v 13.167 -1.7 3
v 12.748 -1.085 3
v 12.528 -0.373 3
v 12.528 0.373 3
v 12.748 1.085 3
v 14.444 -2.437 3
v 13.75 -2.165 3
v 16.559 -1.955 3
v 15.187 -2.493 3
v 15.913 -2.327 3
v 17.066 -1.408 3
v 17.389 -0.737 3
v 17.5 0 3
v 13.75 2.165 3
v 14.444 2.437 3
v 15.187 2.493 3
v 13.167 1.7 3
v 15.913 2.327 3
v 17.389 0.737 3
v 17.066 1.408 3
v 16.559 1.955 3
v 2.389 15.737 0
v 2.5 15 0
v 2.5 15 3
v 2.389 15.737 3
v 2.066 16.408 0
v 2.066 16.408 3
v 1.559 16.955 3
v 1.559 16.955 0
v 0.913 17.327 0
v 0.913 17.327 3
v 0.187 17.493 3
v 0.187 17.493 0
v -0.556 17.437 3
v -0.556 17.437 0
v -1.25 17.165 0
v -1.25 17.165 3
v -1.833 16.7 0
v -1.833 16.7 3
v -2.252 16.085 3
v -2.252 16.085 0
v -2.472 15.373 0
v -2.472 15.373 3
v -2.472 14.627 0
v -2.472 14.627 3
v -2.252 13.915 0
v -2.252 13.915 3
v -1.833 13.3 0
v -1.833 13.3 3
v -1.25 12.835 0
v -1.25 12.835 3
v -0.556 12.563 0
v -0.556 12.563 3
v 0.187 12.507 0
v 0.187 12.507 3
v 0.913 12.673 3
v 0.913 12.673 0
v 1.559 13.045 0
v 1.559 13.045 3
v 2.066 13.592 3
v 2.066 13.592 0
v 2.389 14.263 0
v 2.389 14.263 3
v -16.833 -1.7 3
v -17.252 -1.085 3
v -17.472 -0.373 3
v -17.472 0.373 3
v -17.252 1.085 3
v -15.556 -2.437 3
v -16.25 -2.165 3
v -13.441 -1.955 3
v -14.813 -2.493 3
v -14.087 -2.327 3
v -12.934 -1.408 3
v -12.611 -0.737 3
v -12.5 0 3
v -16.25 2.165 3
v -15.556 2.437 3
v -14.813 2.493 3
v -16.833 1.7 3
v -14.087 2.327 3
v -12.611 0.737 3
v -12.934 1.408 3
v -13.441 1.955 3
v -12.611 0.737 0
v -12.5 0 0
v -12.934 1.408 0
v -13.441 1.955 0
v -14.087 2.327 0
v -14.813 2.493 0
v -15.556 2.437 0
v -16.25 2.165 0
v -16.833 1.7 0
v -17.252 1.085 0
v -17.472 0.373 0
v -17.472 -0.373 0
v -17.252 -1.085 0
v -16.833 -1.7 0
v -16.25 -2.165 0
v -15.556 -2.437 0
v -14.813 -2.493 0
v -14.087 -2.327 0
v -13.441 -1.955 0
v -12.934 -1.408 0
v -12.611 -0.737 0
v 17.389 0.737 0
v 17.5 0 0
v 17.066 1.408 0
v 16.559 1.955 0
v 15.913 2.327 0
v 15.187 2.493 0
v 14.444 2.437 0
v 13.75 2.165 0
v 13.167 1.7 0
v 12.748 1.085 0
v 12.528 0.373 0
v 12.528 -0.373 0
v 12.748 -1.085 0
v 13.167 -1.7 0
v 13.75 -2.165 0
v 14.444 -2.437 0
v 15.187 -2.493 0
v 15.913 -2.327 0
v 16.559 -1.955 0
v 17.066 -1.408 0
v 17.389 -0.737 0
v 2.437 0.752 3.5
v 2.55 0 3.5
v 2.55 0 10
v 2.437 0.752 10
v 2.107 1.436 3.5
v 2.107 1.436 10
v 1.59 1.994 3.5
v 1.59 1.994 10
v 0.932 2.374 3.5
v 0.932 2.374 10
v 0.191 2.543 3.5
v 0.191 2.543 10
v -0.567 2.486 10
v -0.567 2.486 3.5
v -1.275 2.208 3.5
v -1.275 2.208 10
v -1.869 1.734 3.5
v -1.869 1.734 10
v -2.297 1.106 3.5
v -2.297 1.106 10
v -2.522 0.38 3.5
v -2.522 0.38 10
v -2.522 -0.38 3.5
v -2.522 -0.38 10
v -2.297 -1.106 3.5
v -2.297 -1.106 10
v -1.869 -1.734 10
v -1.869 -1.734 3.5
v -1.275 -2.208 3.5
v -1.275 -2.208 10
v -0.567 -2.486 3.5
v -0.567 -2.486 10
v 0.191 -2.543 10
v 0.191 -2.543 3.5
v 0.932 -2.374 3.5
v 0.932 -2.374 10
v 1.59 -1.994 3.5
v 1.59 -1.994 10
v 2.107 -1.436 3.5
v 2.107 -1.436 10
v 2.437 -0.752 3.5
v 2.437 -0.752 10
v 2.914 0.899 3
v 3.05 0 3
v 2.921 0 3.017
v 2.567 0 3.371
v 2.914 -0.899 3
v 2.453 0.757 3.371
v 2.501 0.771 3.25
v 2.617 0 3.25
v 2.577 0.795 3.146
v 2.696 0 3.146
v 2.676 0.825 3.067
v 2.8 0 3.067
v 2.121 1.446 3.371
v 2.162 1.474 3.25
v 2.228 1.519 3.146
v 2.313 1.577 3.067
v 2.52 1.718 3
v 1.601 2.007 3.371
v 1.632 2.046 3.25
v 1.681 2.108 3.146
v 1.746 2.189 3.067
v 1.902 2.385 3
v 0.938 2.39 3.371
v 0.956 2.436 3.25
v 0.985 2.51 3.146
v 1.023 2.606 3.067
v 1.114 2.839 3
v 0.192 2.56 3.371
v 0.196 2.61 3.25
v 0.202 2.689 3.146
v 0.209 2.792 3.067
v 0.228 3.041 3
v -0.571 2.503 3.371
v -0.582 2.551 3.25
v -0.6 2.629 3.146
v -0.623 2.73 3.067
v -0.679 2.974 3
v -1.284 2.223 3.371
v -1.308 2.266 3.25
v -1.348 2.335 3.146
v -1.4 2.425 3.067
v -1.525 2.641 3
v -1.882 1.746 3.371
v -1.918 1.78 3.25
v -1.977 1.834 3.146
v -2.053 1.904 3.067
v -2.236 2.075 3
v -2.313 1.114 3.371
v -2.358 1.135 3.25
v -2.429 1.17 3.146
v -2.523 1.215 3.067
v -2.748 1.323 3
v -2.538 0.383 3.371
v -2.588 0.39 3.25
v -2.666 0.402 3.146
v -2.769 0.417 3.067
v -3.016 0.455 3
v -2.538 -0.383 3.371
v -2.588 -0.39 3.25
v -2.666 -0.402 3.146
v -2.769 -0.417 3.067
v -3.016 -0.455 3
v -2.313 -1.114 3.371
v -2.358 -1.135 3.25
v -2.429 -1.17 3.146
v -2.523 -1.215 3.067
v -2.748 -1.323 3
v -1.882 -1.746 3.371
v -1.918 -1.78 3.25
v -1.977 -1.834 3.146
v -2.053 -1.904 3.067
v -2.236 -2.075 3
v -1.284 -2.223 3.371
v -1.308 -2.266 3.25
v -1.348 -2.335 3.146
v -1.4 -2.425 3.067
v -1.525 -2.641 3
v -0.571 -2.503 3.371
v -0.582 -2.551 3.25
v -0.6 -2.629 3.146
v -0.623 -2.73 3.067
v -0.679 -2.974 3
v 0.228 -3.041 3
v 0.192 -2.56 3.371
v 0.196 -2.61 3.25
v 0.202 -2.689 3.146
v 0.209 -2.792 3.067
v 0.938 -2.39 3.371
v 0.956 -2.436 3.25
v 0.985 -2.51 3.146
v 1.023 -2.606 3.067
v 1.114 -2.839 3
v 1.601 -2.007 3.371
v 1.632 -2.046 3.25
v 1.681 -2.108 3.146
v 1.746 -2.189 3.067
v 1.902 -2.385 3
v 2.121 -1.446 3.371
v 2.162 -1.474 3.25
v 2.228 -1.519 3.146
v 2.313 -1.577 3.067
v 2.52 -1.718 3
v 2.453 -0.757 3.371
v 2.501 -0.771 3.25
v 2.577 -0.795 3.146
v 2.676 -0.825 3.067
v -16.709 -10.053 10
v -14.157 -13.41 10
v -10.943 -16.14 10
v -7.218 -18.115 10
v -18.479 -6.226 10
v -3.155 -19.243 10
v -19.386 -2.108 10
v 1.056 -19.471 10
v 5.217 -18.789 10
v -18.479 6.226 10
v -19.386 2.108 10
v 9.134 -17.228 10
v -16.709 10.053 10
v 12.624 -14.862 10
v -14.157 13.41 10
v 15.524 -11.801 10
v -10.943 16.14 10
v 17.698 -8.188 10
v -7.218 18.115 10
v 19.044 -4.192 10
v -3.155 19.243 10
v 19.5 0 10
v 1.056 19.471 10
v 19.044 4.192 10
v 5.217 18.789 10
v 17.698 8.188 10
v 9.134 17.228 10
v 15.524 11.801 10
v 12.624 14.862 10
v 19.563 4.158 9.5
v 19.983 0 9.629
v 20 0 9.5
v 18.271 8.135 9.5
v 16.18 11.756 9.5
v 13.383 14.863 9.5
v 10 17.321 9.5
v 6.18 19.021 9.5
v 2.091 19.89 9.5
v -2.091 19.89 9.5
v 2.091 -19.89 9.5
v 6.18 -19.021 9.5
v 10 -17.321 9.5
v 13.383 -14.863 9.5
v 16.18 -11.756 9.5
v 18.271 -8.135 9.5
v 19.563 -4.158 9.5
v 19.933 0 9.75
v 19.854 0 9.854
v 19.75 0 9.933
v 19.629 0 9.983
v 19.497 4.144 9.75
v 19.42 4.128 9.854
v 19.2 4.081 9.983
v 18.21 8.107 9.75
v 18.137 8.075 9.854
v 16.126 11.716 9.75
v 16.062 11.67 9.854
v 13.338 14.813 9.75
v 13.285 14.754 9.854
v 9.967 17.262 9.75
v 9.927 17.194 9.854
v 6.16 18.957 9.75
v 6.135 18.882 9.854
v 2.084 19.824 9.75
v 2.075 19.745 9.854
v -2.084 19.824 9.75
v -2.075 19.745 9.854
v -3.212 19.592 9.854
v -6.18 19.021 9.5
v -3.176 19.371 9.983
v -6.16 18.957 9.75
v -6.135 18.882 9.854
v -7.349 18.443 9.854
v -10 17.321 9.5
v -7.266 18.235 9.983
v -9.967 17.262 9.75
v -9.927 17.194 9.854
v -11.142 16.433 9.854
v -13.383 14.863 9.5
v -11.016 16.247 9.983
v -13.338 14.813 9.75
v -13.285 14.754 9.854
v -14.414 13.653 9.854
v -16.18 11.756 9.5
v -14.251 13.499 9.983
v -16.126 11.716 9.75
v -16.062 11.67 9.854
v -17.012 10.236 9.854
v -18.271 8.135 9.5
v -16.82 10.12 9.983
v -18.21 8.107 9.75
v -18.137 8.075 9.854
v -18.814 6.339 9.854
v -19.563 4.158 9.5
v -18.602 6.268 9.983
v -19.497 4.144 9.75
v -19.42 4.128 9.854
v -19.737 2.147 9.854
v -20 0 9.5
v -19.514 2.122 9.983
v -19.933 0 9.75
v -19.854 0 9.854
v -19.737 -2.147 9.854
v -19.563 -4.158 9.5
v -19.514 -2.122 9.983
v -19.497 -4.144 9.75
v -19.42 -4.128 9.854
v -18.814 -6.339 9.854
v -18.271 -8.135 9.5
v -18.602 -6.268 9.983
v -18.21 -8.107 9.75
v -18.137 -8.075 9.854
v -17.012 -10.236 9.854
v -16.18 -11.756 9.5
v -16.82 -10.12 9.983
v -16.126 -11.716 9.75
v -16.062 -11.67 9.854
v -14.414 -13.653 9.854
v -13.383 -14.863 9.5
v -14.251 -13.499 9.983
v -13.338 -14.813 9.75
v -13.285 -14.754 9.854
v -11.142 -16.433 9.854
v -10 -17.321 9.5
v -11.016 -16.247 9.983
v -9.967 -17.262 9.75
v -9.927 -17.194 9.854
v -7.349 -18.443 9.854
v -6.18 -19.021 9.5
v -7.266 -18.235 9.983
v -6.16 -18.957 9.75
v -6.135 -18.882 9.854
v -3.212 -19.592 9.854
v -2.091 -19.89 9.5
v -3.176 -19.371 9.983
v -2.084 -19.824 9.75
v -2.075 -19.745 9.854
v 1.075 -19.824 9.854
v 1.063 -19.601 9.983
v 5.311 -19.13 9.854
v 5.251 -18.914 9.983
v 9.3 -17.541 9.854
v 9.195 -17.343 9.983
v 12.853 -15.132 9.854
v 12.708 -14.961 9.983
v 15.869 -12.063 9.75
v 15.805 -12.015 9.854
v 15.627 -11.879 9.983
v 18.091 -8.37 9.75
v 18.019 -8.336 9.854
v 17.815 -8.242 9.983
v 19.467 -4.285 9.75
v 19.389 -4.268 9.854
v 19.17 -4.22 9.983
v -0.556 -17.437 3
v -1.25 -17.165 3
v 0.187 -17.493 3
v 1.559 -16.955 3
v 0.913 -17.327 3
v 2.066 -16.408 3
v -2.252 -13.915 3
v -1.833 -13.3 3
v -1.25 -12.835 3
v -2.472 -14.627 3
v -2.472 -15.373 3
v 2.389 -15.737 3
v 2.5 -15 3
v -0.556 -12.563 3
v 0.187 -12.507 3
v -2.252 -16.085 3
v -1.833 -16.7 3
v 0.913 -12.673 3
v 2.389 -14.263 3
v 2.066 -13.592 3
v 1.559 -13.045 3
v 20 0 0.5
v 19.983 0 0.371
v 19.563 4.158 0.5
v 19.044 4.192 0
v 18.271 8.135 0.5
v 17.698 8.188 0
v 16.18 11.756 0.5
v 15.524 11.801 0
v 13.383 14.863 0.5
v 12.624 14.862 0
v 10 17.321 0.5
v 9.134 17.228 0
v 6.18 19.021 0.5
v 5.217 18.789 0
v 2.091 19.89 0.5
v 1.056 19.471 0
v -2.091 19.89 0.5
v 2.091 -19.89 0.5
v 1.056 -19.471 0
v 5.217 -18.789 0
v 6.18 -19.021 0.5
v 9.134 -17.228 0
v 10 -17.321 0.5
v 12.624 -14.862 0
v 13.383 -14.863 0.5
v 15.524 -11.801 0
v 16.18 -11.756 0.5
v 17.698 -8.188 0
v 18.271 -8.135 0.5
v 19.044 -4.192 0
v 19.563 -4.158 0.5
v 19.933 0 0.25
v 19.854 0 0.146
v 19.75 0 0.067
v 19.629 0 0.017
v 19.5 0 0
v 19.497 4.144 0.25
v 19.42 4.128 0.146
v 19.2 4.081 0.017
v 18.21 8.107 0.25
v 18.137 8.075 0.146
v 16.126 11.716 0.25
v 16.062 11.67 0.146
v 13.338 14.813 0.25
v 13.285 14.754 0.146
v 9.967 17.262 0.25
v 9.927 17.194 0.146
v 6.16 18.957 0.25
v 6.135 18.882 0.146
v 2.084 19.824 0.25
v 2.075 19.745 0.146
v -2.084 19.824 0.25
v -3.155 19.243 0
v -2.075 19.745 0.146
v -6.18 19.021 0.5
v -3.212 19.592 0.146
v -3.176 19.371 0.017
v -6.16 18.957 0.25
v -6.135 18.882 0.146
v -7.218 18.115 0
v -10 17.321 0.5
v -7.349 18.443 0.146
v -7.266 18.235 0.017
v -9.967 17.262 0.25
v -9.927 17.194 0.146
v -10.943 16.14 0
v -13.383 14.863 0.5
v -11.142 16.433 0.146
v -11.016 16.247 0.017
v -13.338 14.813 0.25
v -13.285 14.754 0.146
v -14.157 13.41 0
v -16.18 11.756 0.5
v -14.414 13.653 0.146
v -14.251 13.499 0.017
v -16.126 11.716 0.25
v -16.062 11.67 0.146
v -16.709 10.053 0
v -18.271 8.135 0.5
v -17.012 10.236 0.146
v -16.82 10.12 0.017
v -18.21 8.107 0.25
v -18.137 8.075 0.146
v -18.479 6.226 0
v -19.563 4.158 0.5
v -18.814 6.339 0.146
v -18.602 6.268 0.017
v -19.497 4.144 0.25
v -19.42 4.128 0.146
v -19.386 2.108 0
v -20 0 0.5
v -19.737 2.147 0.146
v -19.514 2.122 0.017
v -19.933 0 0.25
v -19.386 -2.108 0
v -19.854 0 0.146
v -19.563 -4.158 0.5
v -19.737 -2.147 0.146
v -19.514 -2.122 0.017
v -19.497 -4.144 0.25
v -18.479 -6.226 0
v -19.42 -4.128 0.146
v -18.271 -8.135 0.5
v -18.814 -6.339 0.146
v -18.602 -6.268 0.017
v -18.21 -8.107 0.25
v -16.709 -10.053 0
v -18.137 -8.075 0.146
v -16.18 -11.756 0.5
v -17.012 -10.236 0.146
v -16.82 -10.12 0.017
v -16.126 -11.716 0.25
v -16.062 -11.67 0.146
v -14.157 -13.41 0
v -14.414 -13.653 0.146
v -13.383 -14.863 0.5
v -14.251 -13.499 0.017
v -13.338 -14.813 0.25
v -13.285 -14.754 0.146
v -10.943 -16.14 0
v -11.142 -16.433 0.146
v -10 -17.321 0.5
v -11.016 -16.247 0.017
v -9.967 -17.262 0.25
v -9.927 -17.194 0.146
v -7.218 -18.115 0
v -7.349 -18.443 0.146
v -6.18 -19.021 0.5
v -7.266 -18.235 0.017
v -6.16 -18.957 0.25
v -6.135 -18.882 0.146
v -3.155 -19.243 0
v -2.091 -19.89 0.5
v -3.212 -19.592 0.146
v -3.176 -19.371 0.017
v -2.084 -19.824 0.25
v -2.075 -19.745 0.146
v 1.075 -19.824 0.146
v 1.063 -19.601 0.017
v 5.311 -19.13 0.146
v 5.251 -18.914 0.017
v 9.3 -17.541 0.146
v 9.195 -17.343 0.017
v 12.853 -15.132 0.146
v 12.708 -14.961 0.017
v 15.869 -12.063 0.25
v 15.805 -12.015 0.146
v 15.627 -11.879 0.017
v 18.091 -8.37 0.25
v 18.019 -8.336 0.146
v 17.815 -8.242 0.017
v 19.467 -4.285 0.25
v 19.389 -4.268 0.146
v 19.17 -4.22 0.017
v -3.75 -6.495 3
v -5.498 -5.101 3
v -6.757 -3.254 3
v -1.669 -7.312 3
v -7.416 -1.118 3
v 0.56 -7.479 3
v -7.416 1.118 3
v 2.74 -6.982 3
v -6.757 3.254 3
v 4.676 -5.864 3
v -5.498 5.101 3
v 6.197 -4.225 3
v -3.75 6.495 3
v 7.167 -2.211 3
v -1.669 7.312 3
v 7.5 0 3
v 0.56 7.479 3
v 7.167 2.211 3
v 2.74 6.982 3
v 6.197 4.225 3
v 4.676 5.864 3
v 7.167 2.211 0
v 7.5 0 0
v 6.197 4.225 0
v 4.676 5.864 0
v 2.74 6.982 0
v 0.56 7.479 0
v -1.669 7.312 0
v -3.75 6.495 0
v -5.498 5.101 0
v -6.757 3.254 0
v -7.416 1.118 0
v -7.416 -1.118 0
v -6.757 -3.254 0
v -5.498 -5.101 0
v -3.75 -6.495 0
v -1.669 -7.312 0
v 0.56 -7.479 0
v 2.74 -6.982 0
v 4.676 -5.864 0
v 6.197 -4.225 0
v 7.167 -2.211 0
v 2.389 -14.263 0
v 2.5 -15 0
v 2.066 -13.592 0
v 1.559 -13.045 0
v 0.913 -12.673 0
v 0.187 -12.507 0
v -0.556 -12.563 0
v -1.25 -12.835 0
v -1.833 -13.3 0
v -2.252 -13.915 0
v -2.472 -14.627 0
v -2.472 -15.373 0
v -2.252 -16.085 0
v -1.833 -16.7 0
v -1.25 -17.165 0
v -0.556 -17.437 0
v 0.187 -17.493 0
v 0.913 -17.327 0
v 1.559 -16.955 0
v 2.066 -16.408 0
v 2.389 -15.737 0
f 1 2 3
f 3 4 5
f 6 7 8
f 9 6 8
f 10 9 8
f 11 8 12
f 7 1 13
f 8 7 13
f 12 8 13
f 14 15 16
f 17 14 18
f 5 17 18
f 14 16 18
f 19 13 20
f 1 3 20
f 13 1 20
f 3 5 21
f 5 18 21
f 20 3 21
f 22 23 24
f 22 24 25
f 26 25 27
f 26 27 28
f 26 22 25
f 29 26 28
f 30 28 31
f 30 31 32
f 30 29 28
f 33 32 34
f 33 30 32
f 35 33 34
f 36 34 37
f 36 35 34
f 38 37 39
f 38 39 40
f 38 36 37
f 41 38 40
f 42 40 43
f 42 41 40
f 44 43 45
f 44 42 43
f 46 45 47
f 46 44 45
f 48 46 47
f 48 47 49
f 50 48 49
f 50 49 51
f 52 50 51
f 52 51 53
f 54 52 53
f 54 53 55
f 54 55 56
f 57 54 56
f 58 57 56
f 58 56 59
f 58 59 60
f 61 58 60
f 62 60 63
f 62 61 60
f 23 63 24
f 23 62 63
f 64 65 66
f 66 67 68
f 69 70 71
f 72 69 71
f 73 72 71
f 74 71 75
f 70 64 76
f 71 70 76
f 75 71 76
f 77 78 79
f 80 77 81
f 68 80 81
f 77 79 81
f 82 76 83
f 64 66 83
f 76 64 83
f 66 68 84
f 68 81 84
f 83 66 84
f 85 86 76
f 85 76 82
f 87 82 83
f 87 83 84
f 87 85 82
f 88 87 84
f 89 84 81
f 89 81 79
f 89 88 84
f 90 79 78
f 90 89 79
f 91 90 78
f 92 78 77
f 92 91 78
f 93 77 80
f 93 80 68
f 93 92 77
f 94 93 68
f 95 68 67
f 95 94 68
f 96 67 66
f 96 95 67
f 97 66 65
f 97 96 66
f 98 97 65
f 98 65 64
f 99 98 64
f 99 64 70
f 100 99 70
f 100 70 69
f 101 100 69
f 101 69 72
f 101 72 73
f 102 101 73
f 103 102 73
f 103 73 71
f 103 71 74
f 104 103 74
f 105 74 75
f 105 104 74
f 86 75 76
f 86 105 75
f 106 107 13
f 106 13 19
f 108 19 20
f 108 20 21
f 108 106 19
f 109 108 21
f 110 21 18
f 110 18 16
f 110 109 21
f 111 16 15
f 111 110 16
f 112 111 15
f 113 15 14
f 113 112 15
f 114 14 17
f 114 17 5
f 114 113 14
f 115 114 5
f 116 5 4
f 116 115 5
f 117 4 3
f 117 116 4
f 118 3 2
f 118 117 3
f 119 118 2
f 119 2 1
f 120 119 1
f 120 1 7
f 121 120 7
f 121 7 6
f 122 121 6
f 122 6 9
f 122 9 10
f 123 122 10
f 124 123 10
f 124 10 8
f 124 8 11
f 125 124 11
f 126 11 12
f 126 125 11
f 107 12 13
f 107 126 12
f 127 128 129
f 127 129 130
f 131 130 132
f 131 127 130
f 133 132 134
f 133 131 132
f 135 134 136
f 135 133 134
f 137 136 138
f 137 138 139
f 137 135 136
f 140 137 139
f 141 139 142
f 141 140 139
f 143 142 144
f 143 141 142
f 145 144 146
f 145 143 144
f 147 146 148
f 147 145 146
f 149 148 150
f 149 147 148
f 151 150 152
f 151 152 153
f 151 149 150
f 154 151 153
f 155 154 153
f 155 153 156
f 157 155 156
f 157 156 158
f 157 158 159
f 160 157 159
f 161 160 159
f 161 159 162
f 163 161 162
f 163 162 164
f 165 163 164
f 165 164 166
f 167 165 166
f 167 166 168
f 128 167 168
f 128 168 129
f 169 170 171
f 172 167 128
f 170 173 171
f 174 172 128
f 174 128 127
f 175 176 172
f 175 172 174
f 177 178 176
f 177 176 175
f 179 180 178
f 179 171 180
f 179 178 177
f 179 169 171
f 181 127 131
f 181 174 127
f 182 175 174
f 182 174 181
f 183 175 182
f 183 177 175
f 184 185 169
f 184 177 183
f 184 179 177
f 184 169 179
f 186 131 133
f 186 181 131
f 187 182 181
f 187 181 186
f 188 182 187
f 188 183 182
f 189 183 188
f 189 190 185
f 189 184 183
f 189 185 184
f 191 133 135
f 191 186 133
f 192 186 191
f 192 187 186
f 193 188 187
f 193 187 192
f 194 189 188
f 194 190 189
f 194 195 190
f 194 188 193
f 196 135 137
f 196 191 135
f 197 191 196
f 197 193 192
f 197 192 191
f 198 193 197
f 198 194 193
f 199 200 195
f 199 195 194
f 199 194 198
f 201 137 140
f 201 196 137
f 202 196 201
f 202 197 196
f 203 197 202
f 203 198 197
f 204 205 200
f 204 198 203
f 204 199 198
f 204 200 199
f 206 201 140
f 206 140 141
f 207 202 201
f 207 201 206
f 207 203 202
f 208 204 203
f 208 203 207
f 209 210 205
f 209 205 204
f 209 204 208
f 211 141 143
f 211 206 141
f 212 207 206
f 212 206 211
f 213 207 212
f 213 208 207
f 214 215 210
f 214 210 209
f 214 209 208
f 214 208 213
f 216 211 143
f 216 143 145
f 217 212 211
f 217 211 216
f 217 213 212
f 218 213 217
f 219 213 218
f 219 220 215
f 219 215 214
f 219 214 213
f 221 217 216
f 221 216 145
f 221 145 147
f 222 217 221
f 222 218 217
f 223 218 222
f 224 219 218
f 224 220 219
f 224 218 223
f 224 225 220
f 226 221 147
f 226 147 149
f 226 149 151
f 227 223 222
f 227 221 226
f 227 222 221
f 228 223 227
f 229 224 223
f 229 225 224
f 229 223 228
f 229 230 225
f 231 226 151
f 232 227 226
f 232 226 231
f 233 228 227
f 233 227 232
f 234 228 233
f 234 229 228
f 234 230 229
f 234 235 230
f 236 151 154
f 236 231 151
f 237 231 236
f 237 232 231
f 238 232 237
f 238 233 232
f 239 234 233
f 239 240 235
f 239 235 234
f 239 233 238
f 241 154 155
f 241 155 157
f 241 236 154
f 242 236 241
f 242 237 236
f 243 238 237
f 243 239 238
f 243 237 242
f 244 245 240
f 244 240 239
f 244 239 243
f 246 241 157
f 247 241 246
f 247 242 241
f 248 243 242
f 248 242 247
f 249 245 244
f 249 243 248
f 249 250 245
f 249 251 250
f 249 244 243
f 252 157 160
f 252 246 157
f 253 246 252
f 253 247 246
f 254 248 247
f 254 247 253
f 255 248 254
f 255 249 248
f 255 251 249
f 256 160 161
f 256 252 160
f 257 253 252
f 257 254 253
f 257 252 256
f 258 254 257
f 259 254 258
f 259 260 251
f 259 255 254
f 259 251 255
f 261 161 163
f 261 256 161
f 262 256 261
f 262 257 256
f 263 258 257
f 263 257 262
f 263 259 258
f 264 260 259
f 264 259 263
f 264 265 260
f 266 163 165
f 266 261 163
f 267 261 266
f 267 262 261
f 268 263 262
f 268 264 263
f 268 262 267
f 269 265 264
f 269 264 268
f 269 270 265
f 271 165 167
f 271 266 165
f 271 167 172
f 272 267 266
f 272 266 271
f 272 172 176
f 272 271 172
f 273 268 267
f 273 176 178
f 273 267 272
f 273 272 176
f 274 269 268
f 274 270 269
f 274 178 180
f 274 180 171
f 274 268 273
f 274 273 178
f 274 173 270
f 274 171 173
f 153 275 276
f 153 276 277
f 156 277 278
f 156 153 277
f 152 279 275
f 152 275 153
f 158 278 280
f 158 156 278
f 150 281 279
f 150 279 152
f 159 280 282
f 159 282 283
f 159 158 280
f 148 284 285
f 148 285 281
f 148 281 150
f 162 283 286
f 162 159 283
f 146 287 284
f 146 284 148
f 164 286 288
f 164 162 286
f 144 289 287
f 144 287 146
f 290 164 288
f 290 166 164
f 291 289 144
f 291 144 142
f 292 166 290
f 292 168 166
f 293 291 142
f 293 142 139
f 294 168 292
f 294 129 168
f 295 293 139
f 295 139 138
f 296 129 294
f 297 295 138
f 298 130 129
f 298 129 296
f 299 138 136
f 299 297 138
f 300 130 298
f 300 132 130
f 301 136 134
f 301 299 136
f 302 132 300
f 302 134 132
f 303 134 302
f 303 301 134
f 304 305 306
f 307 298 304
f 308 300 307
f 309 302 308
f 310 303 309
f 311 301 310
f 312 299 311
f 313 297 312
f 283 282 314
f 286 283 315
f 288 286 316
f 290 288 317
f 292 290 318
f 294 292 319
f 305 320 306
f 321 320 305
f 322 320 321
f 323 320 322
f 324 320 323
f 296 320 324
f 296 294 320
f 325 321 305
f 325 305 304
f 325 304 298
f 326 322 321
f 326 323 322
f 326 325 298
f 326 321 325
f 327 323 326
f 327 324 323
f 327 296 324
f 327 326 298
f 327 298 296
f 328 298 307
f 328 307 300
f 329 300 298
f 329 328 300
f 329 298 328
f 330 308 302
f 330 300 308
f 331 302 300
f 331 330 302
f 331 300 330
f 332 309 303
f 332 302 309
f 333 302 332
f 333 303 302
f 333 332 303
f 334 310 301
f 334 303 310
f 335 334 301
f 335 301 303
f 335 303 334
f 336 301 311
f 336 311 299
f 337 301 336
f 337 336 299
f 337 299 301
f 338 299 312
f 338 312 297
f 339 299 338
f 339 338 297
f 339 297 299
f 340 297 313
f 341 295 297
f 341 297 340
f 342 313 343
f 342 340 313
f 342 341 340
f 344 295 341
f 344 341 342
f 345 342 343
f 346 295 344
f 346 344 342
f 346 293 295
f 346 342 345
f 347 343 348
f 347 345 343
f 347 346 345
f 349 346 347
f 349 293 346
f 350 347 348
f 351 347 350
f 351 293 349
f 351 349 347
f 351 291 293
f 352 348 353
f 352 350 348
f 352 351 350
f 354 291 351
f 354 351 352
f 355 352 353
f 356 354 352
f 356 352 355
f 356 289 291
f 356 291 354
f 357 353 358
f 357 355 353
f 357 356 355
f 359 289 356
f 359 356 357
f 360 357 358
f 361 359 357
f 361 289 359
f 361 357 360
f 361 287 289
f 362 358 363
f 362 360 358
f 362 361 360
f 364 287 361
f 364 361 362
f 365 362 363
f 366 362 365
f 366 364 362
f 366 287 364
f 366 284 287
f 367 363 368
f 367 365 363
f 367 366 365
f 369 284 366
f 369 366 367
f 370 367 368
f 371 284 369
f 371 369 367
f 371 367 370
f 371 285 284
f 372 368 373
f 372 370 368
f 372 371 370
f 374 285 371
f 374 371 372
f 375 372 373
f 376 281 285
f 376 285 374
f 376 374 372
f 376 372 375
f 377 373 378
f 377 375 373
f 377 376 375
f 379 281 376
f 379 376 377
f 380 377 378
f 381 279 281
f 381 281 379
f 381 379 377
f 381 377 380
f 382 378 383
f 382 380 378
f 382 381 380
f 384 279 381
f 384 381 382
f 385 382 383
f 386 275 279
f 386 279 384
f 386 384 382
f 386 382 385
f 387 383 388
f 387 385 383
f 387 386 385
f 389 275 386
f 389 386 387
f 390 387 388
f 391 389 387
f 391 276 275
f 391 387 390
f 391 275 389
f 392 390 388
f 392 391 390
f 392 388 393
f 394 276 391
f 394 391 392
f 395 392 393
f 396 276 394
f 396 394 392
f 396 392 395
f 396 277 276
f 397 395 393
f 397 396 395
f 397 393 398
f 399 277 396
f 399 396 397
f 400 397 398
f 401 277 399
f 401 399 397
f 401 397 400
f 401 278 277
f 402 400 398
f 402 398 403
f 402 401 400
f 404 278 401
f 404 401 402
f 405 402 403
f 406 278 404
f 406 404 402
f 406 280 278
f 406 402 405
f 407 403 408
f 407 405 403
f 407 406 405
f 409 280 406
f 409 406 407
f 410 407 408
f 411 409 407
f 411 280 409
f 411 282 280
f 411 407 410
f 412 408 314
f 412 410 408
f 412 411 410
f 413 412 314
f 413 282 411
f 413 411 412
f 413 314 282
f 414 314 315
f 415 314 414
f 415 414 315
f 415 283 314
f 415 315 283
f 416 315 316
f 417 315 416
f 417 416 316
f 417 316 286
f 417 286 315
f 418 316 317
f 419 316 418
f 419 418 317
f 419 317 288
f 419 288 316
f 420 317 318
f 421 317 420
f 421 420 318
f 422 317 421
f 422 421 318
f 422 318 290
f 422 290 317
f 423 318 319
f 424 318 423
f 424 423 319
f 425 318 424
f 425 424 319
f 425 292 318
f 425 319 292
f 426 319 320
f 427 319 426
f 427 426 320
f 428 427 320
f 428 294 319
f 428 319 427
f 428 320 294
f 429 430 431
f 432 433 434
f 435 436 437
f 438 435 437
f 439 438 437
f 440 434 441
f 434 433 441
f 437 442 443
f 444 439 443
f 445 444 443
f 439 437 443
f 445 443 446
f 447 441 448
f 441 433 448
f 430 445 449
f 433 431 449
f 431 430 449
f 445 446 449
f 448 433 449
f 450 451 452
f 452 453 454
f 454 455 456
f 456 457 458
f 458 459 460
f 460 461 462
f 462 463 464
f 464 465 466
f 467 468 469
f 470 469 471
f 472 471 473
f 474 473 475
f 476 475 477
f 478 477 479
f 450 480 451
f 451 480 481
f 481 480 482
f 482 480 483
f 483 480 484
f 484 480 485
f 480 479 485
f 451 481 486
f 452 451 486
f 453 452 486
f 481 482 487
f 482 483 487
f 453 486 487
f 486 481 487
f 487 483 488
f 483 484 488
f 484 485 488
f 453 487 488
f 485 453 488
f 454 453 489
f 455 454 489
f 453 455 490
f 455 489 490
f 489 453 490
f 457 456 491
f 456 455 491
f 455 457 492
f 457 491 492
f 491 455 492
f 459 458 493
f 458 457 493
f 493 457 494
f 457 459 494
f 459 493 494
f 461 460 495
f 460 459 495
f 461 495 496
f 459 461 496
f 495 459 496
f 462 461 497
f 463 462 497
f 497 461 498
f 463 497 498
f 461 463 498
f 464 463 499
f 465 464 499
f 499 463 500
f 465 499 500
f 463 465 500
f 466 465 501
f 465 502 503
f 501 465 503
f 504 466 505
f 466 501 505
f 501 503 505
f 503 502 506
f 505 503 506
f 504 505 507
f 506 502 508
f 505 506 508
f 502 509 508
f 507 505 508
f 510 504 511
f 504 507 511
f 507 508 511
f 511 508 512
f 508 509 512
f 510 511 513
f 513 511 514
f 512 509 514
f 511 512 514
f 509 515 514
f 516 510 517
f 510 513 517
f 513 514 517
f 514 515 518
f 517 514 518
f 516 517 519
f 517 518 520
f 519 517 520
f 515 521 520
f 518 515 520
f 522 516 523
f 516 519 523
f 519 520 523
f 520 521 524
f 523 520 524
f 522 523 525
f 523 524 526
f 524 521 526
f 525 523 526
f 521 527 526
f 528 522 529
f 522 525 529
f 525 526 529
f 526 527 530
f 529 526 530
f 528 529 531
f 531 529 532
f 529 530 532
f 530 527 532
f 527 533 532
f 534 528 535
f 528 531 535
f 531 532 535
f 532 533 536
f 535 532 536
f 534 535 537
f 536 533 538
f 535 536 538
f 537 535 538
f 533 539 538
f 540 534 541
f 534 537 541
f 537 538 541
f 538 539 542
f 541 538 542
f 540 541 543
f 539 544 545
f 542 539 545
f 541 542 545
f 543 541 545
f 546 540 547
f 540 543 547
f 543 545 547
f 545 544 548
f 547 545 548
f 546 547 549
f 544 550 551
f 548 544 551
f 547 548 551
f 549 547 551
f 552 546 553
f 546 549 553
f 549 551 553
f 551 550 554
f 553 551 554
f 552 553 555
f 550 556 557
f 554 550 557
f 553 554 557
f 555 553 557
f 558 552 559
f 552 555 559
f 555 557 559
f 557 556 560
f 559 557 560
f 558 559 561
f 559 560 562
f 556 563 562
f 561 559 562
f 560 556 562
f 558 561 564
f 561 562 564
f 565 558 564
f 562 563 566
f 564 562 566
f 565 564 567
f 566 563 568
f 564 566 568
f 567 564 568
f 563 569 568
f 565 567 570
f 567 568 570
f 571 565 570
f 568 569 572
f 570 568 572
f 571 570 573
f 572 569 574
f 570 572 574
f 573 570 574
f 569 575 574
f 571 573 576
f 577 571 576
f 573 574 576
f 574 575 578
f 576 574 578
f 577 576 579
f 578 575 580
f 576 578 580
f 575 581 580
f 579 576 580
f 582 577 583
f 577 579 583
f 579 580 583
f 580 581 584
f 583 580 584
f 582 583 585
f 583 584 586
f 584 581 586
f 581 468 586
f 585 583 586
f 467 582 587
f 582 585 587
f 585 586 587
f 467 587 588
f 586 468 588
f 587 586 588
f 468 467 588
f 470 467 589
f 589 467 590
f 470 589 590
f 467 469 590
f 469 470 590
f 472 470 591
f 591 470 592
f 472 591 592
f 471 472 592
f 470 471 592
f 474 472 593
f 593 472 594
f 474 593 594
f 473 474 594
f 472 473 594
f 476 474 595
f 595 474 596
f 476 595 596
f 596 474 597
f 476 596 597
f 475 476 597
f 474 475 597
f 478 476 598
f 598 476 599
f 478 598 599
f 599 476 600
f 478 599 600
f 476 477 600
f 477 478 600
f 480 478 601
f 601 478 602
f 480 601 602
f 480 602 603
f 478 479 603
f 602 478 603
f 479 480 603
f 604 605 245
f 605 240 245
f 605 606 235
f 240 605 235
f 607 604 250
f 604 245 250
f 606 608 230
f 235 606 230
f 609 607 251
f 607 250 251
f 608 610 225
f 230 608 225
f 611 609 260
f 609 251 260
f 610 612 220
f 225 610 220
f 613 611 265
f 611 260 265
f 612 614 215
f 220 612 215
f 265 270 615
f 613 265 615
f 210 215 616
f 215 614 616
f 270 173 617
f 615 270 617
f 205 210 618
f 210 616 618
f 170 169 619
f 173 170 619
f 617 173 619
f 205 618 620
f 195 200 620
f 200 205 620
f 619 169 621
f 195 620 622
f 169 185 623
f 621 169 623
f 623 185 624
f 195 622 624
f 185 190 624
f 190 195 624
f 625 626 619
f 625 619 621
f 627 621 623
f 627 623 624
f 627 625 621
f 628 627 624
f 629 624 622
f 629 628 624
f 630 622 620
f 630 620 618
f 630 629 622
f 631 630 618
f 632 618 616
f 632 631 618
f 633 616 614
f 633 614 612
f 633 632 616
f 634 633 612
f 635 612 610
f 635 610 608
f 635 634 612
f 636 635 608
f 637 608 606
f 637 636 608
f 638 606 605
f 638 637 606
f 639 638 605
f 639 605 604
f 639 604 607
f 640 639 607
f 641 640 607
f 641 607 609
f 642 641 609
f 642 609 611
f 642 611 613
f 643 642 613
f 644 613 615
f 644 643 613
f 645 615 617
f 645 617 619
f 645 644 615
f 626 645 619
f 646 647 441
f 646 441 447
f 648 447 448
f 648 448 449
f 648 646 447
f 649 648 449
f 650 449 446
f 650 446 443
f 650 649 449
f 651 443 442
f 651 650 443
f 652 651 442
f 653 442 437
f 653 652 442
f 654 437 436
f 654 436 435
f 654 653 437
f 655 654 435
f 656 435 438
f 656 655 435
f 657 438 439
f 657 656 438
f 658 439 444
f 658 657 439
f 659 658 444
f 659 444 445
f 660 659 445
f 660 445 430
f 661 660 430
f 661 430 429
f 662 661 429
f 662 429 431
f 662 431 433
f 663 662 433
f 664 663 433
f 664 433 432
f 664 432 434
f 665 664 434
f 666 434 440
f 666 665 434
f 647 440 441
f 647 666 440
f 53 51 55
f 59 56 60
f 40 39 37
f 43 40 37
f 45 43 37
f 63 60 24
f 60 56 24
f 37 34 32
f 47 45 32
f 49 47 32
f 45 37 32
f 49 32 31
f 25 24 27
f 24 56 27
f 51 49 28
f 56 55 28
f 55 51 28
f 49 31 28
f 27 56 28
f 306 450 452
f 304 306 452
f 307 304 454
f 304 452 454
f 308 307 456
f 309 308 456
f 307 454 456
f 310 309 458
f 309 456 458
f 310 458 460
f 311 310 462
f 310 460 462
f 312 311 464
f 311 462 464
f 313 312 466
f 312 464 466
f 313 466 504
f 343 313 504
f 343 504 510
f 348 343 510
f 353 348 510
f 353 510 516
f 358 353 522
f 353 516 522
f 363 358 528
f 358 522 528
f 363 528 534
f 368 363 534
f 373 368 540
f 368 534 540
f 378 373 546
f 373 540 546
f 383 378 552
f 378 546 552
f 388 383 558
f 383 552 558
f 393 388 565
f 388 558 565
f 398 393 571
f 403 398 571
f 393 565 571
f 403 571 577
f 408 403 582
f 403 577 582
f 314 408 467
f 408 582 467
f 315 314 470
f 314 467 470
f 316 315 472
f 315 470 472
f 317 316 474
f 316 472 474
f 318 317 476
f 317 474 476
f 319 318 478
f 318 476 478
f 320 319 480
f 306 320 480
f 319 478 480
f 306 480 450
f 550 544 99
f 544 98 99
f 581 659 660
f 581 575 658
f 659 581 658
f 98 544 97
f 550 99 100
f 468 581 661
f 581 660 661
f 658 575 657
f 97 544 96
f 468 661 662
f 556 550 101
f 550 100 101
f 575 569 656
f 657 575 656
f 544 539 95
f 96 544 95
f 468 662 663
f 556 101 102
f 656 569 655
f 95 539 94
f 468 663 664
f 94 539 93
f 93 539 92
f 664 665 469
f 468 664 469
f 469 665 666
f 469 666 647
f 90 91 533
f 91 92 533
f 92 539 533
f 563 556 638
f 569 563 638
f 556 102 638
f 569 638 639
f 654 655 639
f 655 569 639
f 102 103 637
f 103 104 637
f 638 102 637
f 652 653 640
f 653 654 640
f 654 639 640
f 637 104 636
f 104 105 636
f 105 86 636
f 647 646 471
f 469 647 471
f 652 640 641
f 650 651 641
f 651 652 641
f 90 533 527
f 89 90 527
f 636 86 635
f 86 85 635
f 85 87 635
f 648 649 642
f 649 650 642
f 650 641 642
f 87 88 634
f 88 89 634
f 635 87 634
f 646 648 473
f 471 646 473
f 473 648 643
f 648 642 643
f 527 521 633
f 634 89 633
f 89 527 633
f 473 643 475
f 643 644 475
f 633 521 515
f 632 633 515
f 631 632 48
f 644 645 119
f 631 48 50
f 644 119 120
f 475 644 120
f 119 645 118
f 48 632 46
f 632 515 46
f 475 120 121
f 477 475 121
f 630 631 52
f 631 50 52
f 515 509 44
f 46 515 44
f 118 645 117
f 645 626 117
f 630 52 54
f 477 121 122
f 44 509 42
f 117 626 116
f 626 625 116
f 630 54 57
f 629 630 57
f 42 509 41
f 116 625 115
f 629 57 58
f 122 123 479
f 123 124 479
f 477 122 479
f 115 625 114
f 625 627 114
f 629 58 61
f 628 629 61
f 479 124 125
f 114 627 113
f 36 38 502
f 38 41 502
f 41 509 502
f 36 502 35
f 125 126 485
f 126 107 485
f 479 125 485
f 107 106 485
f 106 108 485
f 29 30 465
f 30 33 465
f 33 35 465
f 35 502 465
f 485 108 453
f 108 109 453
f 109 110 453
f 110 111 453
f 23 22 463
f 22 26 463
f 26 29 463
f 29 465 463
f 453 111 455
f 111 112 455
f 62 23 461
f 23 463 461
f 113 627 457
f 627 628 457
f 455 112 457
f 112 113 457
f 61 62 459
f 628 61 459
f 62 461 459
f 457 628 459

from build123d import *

# Parameters (mm, degrees)
F0_R     = 20
F0_R_2   = 2.5
F0_R_3   = 7.5
F0_R_4   = 2.55
F1_DEPTH = 10
F2_DEPTH = 3
F3_R     = 0.5


with BuildPart() as f1:
    # F0 (on Top) → F1 (new body)
    with BuildSketch(Plane.XY):
        Circle(F0_R)
        with Locations((0, -15)):
            Circle(F0_R_2, mode=Mode.SUBTRACT)
        with Locations((-15, 0)):
            Circle(F0_R_2, mode=Mode.SUBTRACT)
        Circle(F0_R_3, mode=Mode.SUBTRACT)
        with Locations((15, 0)):
            Circle(F0_R_2, mode=Mode.SUBTRACT)
        with Locations((0, 15)):
            Circle(F0_R_2, mode=Mode.SUBTRACT)
        with Locations((-15, 0)):
            Circle(F0_R_2)
        Circle(F0_R_3)
        Circle(F0_R_4, mode=Mode.SUBTRACT)
        with Locations((15, 0)):
            Circle(F0_R_2)
        with Locations((0, -15)):
            Circle(F0_R_2)
        with Locations((0, 15)):
            Circle(F0_R_2)
    extrude(amount=F1_DEPTH)

    # F0 (on Top) → F2 (cut)
    with BuildSketch(Plane.XY):
        with Locations((0, 15)):
            Circle(F0_R_2)
        with Locations((-15, 0)):
            Circle(F0_R_2)
        with Locations((0, -15)):
            Circle(F0_R_2)
        with Locations((15, 0)):
            Circle(F0_R_2)
        Circle(F0_R_3)
        Circle(F0_R_4, mode=Mode.SUBTRACT)
    extrude(amount=F2_DEPTH, mode=Mode.SUBTRACT)

    # F3
    f3_edges = [f1.edges().sort_by_distance(p)[0] for p in [
        (-2.55, 0, 3),
        (-20, 0, 0),
        (-20, 0, 10),
    ]]
    fillet(f3_edges, radius=F3_R)


solid = f1.part
